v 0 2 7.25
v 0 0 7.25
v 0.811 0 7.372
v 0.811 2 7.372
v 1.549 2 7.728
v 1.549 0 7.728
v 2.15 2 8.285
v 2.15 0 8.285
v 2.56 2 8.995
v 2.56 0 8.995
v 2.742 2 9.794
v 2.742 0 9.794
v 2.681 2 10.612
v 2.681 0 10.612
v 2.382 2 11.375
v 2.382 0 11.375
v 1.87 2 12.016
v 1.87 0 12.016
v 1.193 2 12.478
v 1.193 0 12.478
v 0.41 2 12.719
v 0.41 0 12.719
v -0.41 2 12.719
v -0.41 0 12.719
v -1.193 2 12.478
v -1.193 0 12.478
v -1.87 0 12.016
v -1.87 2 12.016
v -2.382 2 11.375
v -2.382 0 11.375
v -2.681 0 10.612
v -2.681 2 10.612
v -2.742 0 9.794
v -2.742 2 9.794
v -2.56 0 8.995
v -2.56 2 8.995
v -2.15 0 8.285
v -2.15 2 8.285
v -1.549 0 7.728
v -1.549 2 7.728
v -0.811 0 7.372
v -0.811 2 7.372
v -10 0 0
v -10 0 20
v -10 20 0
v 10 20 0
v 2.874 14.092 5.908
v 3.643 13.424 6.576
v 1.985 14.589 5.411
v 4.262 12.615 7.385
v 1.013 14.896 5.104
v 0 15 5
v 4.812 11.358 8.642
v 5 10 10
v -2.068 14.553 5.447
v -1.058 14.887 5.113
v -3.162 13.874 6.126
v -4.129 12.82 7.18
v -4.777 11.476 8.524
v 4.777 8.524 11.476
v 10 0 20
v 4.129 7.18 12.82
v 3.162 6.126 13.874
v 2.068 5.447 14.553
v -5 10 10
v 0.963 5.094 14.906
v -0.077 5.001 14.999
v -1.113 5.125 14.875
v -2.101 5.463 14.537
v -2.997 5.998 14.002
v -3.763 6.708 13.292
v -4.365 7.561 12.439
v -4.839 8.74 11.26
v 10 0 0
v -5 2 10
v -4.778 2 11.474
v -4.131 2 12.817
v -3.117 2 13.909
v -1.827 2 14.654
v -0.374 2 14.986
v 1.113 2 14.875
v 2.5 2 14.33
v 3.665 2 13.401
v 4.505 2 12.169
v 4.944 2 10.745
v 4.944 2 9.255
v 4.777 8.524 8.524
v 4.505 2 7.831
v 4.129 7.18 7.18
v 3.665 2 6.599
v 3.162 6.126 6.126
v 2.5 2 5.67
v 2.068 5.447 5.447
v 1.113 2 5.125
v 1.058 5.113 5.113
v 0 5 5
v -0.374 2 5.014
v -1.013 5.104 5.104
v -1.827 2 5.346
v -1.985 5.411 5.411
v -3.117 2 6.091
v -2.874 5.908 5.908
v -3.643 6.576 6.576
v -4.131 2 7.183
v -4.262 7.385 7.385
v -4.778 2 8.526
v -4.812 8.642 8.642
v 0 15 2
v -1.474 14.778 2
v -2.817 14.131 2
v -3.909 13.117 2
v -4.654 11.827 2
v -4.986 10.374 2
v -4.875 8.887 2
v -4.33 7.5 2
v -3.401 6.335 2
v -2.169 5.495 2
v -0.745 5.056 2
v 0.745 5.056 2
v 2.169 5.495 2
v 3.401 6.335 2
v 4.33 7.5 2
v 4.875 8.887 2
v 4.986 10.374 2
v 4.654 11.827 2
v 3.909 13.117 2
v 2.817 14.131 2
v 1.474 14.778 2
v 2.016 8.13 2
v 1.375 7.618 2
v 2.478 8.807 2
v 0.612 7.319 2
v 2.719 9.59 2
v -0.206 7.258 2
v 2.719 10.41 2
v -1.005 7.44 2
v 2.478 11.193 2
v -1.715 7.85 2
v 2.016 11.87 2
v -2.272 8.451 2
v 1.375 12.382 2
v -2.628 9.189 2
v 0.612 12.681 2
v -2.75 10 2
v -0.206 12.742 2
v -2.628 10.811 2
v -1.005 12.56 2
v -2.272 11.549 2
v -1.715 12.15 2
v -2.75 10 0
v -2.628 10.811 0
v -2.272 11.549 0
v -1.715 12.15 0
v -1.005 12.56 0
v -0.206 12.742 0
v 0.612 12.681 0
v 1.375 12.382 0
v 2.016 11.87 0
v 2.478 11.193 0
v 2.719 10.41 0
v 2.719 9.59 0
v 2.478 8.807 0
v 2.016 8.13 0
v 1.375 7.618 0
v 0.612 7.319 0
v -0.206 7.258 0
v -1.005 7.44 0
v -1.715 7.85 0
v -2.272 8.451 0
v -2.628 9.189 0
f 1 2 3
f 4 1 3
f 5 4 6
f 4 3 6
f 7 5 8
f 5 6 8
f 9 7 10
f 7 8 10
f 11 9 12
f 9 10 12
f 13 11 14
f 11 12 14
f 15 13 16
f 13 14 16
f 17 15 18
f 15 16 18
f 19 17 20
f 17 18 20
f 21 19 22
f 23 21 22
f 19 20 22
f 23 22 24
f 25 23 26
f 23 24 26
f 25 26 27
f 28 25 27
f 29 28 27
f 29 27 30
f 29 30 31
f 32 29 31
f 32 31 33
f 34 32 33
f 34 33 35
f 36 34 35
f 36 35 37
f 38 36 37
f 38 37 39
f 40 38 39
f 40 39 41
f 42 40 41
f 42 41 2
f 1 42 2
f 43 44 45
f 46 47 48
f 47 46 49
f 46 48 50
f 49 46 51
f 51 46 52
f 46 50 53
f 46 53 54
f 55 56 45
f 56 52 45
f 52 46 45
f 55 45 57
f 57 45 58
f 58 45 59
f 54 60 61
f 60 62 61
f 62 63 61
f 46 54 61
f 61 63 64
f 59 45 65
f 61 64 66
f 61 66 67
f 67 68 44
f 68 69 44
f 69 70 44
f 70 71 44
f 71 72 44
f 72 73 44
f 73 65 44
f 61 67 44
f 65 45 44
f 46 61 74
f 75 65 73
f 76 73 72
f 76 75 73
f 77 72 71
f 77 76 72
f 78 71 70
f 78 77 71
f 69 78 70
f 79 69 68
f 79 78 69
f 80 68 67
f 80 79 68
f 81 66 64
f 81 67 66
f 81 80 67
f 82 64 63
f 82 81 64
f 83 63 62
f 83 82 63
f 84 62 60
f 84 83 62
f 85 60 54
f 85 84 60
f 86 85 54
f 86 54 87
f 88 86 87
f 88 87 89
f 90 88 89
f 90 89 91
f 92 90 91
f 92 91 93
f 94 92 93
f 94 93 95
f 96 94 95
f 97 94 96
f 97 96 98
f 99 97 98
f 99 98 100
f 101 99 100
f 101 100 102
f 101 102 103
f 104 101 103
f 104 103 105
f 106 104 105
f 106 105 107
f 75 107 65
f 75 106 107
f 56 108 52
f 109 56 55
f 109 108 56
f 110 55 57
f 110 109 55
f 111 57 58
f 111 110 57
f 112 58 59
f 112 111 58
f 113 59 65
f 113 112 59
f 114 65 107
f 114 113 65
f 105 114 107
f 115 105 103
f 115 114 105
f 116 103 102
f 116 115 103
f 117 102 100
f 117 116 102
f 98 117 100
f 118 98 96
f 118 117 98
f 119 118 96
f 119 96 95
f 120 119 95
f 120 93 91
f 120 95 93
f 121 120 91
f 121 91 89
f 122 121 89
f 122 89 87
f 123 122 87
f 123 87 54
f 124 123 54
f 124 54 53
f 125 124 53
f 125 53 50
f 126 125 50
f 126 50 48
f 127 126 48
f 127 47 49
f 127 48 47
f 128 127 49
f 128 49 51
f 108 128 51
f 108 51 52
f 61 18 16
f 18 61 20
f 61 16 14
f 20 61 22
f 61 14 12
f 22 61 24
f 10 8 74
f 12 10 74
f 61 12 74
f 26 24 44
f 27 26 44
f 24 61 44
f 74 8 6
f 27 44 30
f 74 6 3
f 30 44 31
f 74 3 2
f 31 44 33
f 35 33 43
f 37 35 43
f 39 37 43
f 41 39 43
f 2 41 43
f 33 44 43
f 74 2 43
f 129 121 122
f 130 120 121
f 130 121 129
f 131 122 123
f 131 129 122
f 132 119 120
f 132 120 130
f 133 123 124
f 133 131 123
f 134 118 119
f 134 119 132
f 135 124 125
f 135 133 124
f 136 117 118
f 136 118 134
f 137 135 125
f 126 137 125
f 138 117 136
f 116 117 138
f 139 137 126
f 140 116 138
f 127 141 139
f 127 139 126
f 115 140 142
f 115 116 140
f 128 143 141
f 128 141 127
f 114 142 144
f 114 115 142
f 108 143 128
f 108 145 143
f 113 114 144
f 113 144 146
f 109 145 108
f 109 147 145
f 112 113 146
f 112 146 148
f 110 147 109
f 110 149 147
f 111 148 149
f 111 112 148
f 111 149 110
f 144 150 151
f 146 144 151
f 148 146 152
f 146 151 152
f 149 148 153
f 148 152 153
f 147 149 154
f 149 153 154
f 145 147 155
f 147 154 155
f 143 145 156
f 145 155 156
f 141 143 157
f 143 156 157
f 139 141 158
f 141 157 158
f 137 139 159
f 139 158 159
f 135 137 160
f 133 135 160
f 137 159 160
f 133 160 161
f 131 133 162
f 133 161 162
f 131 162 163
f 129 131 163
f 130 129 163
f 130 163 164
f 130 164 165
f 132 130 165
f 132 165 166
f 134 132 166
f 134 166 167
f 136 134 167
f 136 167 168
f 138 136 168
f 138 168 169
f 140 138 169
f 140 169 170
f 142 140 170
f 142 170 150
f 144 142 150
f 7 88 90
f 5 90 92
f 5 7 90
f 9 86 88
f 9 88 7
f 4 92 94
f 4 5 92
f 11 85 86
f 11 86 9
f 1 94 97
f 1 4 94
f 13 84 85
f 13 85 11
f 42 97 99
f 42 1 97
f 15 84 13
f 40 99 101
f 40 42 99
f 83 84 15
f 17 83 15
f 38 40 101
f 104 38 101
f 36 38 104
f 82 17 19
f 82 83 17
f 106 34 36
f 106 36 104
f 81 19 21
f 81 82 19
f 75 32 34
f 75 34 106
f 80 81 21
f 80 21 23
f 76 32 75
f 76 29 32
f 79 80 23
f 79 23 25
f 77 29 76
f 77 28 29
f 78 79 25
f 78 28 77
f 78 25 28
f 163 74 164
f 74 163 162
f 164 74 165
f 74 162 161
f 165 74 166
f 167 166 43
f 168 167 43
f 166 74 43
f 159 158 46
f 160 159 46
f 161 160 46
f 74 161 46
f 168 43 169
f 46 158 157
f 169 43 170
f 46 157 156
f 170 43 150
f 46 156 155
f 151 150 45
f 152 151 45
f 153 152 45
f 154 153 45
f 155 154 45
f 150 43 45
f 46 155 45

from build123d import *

# Parameters (mm, degrees)
CORNER_BASE_DEPTH      = 10
CORNER_BASE_DEPTH_BACK = 10
SKETCH2_R              = 2.75
SCREW_SHAFT_1_DEPTH    = 31
SKETCH3_R              = 2.75
SCREW_SHAFT_2_DEPTH    = 31
SKETCH4_R              = 5
SCREW_SOCKET_1_DEPTH   = 29.705400189
SKETCH5_R              = 5
CUT_EXTRUDE4_DEPTH     = 29.705400189


with BuildPart() as part:
    # Sketch1 → corner base (new, two sides: drawn at the far end of the back side and taken through both)
    with BuildSketch(Plane(origin=(0, 0, 0), x_dir=(0, 0, -1), z_dir=(1, 0, 0)).offset(-CORNER_BASE_DEPTH_BACK)):
        Polygon((0, 0), (0, 20), (-20, 0), align=None)
    extrude(amount=CORNER_BASE_DEPTH + CORNER_BASE_DEPTH_BACK)

    # Sketch2 → screw shaft 1 (cut, through all)
    with BuildSketch(Plane.XZ):
        with Locations((0, 10)):
            Circle(SKETCH2_R)
    extrude(amount=-SCREW_SHAFT_1_DEPTH, mode=Mode.SUBTRACT)

    # Sketch3 → screw shaft 2 (cut, through all)
    with BuildSketch(Plane(origin=(0, 0, 0), x_dir=(-1, 0, 0), z_dir=(0, 0, -1))):
        with Locations((0, 10)):
            Circle(SKETCH3_R)
    extrude(amount=-SCREW_SHAFT_2_DEPTH, mode=Mode.SUBTRACT)

    # Sketch4 → screw socket 1 (cut, through all)
    with BuildSketch(Plane.XY.offset(2)):
        with Locations((0, 10)):
            Circle(SKETCH4_R)
    extrude(amount=SCREW_SOCKET_1_DEPTH, mode=Mode.SUBTRACT)

    # Sketch5 → Cut-Extrude4 (cut, through all)
    with BuildSketch(Plane(origin=(0, 2, 0), x_dir=(1, 0, 0), z_dir=(0, 1, 0))):
        with Locations((0, -10)):
            Circle(SKETCH5_R)
    extrude(amount=CUT_EXTRUDE4_DEPTH, mode=Mode.SUBTRACT)


solid = part.part
